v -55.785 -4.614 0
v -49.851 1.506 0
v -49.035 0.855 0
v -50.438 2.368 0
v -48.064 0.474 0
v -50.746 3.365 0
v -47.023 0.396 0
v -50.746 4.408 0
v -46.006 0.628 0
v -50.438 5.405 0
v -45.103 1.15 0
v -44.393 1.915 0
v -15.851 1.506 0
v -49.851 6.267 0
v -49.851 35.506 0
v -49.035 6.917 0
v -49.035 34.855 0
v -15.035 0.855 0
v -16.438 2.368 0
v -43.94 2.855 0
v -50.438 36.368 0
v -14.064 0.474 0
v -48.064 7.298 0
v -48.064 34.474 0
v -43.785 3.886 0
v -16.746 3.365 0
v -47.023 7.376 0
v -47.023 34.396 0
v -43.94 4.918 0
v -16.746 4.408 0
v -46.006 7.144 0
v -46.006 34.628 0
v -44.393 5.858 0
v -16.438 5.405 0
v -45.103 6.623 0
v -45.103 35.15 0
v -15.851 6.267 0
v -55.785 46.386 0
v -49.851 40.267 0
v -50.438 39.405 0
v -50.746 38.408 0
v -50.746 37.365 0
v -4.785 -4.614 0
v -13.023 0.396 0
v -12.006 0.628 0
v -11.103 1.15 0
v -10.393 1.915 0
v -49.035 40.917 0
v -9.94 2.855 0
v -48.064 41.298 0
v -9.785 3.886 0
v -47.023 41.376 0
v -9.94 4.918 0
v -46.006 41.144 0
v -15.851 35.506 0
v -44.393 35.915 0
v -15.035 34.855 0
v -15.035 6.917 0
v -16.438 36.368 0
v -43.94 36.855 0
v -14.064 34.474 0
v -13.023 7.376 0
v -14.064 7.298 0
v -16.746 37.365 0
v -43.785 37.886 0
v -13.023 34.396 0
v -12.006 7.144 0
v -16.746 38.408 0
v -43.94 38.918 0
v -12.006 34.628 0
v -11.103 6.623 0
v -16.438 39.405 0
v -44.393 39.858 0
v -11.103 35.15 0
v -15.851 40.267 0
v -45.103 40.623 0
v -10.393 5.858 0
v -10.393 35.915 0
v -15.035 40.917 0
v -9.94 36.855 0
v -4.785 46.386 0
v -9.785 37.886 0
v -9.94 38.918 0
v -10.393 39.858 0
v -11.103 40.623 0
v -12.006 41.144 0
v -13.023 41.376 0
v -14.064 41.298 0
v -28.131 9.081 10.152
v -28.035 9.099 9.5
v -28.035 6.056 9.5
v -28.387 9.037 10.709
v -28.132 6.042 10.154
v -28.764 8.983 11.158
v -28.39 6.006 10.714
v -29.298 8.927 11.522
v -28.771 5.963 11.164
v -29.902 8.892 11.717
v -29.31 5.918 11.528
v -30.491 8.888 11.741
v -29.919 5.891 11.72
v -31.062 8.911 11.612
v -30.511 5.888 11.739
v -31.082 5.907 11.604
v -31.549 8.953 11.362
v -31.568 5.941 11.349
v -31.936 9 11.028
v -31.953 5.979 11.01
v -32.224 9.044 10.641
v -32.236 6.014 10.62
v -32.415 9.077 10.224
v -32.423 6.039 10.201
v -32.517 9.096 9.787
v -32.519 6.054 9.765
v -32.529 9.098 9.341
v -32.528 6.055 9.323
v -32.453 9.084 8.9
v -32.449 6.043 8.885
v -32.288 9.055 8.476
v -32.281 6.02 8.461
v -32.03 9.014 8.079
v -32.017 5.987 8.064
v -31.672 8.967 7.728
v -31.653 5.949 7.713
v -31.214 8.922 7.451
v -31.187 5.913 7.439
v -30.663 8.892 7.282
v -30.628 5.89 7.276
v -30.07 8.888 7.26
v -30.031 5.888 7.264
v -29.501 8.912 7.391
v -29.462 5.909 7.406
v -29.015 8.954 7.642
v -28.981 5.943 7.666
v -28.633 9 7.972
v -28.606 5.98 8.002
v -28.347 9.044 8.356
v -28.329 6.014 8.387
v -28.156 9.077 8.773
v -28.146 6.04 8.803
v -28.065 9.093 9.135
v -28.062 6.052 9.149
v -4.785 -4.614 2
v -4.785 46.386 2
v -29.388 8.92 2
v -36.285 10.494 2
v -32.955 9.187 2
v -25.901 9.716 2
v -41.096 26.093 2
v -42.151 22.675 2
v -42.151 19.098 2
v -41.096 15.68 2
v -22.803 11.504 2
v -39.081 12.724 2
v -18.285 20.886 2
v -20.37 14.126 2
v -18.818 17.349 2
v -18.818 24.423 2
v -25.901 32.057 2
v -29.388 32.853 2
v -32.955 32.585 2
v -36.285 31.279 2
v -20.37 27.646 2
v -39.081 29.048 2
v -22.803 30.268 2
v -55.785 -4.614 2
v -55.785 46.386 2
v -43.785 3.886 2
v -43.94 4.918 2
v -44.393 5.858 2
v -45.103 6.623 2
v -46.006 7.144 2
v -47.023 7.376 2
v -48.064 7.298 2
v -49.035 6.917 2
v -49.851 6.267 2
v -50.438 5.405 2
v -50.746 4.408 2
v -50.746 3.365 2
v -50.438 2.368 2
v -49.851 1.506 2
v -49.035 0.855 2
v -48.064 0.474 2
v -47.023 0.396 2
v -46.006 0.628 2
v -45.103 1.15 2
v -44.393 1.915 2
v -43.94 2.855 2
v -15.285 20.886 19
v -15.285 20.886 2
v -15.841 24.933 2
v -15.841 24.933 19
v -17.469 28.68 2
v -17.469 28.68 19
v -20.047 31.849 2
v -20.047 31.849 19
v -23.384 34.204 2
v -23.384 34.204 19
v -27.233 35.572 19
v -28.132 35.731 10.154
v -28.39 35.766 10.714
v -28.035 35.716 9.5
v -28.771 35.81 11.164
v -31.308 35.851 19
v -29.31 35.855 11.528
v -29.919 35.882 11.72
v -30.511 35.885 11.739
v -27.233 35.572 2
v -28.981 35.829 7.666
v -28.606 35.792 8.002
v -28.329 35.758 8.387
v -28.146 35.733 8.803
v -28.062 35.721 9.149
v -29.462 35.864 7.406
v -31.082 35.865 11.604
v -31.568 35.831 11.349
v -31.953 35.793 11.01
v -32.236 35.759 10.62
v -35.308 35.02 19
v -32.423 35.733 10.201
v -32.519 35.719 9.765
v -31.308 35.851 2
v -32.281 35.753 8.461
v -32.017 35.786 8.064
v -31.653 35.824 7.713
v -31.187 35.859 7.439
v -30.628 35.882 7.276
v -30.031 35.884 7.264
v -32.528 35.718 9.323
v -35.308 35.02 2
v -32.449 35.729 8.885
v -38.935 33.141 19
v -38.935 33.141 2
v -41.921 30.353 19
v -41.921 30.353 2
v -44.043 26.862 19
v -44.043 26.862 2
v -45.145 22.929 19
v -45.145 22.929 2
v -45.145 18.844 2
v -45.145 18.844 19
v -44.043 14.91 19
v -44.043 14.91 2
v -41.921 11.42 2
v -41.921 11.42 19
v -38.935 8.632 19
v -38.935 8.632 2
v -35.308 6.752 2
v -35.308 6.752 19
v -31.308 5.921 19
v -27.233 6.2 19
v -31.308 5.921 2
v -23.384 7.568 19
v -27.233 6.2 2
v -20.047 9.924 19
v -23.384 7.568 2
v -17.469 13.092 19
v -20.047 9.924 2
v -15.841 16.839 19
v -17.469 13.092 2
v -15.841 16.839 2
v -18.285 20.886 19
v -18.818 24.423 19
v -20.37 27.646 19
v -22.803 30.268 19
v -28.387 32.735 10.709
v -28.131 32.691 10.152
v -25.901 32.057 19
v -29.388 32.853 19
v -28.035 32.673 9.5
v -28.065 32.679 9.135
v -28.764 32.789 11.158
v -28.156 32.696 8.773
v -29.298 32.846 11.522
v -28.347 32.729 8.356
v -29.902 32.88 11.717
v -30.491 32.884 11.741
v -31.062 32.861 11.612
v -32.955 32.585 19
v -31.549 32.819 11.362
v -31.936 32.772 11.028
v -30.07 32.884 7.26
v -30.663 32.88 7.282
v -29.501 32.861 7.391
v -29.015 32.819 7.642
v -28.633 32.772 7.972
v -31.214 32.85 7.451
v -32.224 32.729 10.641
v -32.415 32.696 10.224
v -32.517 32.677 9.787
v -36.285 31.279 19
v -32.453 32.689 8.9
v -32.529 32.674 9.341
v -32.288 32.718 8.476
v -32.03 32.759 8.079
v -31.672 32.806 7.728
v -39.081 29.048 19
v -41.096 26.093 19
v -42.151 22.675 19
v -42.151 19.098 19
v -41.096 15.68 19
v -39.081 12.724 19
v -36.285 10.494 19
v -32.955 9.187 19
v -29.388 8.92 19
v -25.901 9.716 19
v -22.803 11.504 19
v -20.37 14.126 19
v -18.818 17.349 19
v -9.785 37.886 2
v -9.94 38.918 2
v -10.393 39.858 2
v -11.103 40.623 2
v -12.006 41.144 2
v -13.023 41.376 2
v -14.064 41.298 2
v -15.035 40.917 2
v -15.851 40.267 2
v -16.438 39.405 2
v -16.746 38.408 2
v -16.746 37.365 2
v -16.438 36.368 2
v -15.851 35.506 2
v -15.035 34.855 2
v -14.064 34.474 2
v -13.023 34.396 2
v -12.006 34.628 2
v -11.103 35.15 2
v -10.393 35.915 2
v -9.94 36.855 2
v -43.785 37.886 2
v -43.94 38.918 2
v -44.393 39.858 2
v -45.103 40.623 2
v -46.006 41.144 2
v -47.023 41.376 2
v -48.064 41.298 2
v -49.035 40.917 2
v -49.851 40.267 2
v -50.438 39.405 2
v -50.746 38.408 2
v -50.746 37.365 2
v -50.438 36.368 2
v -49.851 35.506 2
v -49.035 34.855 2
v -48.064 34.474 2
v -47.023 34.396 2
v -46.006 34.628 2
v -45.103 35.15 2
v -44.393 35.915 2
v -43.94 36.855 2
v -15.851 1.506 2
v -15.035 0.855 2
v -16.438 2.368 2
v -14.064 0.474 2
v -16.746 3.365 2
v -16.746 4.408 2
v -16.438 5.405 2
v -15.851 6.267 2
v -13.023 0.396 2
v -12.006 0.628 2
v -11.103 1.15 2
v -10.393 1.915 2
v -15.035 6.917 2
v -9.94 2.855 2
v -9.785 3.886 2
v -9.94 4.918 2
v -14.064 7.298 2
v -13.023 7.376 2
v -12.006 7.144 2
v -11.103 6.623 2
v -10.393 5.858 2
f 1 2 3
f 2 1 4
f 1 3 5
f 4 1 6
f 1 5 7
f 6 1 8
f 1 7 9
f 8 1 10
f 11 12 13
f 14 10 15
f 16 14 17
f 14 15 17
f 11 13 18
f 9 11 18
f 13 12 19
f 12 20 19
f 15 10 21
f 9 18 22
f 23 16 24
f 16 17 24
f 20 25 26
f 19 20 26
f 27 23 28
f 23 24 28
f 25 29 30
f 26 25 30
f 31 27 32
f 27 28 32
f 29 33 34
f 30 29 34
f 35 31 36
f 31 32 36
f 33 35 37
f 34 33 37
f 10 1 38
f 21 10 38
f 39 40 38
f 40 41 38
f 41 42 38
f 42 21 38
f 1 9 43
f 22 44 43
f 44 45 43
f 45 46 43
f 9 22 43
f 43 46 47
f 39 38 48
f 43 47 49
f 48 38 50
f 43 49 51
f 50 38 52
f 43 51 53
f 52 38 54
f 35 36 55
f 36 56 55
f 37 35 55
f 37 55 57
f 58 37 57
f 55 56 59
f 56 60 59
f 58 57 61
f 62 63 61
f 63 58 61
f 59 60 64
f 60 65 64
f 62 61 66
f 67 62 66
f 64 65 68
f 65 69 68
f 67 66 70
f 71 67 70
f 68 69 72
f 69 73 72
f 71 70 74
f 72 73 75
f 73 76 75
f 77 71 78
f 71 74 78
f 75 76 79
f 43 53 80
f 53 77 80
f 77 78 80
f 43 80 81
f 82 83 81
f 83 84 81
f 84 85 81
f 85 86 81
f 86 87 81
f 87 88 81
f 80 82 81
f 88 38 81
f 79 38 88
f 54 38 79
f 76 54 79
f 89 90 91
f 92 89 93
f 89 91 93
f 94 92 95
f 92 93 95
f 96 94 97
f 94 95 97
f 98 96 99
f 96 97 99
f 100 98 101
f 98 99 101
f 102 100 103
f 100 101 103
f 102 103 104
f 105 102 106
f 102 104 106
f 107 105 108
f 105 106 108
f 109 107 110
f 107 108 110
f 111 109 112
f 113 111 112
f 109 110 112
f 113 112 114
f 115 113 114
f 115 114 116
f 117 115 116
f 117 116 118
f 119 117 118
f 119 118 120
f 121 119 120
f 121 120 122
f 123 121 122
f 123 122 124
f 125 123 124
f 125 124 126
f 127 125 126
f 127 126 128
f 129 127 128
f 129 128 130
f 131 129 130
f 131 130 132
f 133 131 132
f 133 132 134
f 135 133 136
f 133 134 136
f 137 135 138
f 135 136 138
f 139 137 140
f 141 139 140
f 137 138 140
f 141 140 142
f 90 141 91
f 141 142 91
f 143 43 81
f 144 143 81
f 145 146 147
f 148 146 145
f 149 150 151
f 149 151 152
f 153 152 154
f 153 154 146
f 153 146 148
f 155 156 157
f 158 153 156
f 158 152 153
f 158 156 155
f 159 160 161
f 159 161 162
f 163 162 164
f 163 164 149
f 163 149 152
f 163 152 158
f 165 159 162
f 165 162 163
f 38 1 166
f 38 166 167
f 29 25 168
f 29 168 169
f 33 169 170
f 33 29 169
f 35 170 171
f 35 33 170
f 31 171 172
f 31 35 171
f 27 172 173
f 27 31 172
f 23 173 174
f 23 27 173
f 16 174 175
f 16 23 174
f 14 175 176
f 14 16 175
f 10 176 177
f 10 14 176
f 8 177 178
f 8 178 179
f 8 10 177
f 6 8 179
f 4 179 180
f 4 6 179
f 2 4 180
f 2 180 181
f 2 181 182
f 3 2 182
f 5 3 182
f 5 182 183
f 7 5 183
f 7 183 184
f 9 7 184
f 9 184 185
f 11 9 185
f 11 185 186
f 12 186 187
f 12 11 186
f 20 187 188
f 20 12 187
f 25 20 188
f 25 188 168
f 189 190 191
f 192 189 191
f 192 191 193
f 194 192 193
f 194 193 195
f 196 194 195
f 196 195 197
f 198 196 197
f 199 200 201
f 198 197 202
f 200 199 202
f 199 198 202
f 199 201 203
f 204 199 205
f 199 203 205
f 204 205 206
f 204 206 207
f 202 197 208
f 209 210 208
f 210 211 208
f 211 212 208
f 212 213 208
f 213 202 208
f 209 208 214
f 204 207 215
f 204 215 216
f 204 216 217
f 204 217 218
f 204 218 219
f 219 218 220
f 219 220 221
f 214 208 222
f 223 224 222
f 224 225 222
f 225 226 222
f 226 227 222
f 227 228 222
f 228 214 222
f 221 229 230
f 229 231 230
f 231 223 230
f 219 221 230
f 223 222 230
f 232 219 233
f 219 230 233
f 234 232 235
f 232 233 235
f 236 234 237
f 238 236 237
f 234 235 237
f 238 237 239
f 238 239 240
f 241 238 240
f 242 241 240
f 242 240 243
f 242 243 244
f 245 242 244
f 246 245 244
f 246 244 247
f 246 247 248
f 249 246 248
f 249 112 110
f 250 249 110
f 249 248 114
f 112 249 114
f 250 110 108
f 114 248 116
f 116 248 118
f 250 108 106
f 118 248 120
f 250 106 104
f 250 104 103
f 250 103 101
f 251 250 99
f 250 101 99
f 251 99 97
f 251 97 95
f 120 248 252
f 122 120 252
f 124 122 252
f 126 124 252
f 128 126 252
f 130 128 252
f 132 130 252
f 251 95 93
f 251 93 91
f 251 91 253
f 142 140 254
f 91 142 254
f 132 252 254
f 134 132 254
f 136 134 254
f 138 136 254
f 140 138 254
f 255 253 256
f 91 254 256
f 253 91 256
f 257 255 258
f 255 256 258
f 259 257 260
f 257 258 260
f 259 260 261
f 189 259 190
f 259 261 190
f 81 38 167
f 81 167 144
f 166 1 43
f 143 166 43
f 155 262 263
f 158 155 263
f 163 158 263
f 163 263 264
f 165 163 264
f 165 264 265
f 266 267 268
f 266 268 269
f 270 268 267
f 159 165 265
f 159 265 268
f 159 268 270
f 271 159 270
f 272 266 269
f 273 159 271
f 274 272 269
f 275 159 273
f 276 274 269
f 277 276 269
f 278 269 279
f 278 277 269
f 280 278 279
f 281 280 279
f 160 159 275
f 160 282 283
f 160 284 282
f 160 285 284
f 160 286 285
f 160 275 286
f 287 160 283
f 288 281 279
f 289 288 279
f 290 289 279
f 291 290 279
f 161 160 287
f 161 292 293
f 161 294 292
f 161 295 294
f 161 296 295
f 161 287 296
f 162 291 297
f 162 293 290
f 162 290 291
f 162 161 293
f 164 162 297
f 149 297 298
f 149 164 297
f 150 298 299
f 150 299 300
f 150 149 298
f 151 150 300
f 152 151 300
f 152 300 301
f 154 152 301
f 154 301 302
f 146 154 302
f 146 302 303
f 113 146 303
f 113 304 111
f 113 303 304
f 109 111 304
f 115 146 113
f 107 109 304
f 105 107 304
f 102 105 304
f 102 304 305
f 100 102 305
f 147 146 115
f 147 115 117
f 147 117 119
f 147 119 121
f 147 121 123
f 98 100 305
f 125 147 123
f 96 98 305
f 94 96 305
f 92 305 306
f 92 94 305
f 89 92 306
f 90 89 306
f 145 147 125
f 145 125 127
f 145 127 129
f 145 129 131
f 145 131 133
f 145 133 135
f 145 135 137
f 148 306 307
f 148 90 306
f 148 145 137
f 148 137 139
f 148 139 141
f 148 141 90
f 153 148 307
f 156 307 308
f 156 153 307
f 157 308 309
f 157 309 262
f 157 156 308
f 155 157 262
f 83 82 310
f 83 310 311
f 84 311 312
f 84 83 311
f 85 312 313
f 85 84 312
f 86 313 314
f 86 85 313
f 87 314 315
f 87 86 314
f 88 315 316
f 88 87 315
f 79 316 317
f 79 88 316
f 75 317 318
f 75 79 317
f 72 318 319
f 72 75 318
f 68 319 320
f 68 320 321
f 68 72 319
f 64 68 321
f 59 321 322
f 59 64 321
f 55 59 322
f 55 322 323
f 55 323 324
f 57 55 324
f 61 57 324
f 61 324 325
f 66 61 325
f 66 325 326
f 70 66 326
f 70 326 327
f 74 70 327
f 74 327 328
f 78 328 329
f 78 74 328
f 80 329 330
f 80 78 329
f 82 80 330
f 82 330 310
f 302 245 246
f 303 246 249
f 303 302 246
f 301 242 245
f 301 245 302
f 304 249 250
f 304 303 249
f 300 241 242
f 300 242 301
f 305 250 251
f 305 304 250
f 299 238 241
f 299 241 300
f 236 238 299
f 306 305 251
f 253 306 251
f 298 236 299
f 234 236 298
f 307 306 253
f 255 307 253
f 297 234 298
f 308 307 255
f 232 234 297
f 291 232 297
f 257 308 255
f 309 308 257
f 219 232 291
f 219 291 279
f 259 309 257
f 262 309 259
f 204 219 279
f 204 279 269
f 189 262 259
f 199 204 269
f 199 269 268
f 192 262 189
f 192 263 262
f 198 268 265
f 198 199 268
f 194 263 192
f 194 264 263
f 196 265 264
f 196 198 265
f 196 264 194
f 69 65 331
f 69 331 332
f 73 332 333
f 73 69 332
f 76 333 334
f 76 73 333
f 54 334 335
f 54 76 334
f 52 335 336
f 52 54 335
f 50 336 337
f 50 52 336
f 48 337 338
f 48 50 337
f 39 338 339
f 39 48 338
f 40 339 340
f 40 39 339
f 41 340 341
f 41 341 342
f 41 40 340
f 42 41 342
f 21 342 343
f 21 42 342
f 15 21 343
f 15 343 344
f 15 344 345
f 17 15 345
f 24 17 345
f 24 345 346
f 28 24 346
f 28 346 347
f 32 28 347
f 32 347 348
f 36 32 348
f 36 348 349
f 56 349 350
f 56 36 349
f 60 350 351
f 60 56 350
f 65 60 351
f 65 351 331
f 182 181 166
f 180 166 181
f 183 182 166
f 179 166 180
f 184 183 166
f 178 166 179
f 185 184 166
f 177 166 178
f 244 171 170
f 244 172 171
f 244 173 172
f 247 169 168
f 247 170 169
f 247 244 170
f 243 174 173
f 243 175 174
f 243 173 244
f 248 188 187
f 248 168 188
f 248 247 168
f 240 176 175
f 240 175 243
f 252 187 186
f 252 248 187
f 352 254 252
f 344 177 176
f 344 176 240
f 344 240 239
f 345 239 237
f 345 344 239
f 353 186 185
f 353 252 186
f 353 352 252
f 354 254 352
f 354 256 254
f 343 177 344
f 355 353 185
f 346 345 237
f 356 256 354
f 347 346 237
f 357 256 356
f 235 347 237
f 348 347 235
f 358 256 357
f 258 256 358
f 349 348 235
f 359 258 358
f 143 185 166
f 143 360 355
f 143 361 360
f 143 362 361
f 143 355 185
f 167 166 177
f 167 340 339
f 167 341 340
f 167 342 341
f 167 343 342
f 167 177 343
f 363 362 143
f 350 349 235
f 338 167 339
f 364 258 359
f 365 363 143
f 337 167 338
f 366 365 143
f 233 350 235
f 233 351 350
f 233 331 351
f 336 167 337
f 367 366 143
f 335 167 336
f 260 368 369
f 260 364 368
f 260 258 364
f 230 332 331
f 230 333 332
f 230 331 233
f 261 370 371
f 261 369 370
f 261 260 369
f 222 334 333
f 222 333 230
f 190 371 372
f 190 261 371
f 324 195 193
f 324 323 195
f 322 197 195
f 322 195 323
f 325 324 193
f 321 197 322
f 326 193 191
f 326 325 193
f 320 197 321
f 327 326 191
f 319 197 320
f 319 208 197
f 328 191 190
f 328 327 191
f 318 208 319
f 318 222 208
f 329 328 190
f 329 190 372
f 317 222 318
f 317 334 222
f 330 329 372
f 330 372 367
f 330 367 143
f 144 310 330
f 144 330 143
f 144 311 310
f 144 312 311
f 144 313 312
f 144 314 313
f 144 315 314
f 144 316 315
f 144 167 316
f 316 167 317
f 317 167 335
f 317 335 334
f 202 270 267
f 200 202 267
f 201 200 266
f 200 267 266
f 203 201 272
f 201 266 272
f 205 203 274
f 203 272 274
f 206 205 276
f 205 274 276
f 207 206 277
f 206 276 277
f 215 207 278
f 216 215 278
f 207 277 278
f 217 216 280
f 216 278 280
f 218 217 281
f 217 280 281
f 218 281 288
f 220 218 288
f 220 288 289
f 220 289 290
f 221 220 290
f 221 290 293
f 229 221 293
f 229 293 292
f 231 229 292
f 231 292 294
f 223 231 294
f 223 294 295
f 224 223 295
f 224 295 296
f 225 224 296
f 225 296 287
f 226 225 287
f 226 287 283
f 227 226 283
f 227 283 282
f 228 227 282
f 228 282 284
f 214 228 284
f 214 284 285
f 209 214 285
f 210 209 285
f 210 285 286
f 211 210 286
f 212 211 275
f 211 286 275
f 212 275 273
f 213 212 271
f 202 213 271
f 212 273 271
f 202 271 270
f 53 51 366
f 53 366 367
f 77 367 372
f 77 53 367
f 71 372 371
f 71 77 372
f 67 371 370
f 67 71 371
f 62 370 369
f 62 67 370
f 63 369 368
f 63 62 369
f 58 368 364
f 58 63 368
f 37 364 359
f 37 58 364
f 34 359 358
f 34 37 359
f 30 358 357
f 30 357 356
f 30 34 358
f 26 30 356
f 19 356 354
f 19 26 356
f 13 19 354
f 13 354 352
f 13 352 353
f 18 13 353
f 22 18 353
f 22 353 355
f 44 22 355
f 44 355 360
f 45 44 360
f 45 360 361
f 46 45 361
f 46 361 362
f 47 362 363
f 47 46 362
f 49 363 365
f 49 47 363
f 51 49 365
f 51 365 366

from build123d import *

# Parameters (mm, degrees)
F0_W     = 51
F0_H     = 51
F0_R     = 3.5
F1_DEPTH = 2
F2_R     = 15
F2_R_2   = 12
F3_DEPTH = 17
F4_W     = 51
F4_H     = 2.453923
F5_DEPTH = 17
F6_R     = 2.25
F7_DEPTH = 51.001
F8_W     = 51
F8_H     = 2.453923
F9_DEPTH = 17


with BuildPart() as f1:
    # F0 (on Top) → F1 (new body)
    with BuildSketch(Plane.XY):
        with Locations((-30.284861, 20.886204)):
            Rectangle(F0_W, F0_H)
        with Locations((-47.284861, 3.886204)):
            Circle(F0_R, mode=Mode.SUBTRACT)
        with Locations((-13.284861, 3.886204)):
            Circle(F0_R, mode=Mode.SUBTRACT)
        with Locations((-47.284861, 37.886204)):
            Circle(F0_R, mode=Mode.SUBTRACT)
        with Locations((-13.284861, 37.886204)):
            Circle(F0_R, mode=Mode.SUBTRACT)
    extrude(amount=F1_DEPTH)

    # F2 (on face) → F3 (join)
    with BuildSketch(Plane.XY.offset(2)):
        with Locations((-30.284861, 20.886204)):
            Circle(F2_R)
        with Locations((-30.284861, 20.886204)):
            Circle(F2_R_2, mode=Mode.SUBTRACT)
    extrude(amount=F3_DEPTH)

    # F4 (on face) → F5 (join)
    with BuildSketch(Plane.XY.offset(2)):
        with Locations((-30.284861, -3.386834)):
            Rectangle(F4_W, F4_H)
    extrude(amount=F5_DEPTH)

    # F6 (on face) → F7 (cut, through all)
    with BuildSketch(Plane.XZ.offset(4.613796)):
        with Locations((-30.284861, 9.5)):
            Circle(F6_R)
    extrude(amount=-F7_DEPTH, mode=Mode.SUBTRACT)

    # F8 (on face) → F9 (cut)
    with BuildSketch(Plane.XY.offset(19)):
        with Locations((-30.284861, -3.386834)):
            Rectangle(F8_W, F8_H)
    extrude(amount=-F9_DEPTH, mode=Mode.SUBTRACT)


solid = f1.part
